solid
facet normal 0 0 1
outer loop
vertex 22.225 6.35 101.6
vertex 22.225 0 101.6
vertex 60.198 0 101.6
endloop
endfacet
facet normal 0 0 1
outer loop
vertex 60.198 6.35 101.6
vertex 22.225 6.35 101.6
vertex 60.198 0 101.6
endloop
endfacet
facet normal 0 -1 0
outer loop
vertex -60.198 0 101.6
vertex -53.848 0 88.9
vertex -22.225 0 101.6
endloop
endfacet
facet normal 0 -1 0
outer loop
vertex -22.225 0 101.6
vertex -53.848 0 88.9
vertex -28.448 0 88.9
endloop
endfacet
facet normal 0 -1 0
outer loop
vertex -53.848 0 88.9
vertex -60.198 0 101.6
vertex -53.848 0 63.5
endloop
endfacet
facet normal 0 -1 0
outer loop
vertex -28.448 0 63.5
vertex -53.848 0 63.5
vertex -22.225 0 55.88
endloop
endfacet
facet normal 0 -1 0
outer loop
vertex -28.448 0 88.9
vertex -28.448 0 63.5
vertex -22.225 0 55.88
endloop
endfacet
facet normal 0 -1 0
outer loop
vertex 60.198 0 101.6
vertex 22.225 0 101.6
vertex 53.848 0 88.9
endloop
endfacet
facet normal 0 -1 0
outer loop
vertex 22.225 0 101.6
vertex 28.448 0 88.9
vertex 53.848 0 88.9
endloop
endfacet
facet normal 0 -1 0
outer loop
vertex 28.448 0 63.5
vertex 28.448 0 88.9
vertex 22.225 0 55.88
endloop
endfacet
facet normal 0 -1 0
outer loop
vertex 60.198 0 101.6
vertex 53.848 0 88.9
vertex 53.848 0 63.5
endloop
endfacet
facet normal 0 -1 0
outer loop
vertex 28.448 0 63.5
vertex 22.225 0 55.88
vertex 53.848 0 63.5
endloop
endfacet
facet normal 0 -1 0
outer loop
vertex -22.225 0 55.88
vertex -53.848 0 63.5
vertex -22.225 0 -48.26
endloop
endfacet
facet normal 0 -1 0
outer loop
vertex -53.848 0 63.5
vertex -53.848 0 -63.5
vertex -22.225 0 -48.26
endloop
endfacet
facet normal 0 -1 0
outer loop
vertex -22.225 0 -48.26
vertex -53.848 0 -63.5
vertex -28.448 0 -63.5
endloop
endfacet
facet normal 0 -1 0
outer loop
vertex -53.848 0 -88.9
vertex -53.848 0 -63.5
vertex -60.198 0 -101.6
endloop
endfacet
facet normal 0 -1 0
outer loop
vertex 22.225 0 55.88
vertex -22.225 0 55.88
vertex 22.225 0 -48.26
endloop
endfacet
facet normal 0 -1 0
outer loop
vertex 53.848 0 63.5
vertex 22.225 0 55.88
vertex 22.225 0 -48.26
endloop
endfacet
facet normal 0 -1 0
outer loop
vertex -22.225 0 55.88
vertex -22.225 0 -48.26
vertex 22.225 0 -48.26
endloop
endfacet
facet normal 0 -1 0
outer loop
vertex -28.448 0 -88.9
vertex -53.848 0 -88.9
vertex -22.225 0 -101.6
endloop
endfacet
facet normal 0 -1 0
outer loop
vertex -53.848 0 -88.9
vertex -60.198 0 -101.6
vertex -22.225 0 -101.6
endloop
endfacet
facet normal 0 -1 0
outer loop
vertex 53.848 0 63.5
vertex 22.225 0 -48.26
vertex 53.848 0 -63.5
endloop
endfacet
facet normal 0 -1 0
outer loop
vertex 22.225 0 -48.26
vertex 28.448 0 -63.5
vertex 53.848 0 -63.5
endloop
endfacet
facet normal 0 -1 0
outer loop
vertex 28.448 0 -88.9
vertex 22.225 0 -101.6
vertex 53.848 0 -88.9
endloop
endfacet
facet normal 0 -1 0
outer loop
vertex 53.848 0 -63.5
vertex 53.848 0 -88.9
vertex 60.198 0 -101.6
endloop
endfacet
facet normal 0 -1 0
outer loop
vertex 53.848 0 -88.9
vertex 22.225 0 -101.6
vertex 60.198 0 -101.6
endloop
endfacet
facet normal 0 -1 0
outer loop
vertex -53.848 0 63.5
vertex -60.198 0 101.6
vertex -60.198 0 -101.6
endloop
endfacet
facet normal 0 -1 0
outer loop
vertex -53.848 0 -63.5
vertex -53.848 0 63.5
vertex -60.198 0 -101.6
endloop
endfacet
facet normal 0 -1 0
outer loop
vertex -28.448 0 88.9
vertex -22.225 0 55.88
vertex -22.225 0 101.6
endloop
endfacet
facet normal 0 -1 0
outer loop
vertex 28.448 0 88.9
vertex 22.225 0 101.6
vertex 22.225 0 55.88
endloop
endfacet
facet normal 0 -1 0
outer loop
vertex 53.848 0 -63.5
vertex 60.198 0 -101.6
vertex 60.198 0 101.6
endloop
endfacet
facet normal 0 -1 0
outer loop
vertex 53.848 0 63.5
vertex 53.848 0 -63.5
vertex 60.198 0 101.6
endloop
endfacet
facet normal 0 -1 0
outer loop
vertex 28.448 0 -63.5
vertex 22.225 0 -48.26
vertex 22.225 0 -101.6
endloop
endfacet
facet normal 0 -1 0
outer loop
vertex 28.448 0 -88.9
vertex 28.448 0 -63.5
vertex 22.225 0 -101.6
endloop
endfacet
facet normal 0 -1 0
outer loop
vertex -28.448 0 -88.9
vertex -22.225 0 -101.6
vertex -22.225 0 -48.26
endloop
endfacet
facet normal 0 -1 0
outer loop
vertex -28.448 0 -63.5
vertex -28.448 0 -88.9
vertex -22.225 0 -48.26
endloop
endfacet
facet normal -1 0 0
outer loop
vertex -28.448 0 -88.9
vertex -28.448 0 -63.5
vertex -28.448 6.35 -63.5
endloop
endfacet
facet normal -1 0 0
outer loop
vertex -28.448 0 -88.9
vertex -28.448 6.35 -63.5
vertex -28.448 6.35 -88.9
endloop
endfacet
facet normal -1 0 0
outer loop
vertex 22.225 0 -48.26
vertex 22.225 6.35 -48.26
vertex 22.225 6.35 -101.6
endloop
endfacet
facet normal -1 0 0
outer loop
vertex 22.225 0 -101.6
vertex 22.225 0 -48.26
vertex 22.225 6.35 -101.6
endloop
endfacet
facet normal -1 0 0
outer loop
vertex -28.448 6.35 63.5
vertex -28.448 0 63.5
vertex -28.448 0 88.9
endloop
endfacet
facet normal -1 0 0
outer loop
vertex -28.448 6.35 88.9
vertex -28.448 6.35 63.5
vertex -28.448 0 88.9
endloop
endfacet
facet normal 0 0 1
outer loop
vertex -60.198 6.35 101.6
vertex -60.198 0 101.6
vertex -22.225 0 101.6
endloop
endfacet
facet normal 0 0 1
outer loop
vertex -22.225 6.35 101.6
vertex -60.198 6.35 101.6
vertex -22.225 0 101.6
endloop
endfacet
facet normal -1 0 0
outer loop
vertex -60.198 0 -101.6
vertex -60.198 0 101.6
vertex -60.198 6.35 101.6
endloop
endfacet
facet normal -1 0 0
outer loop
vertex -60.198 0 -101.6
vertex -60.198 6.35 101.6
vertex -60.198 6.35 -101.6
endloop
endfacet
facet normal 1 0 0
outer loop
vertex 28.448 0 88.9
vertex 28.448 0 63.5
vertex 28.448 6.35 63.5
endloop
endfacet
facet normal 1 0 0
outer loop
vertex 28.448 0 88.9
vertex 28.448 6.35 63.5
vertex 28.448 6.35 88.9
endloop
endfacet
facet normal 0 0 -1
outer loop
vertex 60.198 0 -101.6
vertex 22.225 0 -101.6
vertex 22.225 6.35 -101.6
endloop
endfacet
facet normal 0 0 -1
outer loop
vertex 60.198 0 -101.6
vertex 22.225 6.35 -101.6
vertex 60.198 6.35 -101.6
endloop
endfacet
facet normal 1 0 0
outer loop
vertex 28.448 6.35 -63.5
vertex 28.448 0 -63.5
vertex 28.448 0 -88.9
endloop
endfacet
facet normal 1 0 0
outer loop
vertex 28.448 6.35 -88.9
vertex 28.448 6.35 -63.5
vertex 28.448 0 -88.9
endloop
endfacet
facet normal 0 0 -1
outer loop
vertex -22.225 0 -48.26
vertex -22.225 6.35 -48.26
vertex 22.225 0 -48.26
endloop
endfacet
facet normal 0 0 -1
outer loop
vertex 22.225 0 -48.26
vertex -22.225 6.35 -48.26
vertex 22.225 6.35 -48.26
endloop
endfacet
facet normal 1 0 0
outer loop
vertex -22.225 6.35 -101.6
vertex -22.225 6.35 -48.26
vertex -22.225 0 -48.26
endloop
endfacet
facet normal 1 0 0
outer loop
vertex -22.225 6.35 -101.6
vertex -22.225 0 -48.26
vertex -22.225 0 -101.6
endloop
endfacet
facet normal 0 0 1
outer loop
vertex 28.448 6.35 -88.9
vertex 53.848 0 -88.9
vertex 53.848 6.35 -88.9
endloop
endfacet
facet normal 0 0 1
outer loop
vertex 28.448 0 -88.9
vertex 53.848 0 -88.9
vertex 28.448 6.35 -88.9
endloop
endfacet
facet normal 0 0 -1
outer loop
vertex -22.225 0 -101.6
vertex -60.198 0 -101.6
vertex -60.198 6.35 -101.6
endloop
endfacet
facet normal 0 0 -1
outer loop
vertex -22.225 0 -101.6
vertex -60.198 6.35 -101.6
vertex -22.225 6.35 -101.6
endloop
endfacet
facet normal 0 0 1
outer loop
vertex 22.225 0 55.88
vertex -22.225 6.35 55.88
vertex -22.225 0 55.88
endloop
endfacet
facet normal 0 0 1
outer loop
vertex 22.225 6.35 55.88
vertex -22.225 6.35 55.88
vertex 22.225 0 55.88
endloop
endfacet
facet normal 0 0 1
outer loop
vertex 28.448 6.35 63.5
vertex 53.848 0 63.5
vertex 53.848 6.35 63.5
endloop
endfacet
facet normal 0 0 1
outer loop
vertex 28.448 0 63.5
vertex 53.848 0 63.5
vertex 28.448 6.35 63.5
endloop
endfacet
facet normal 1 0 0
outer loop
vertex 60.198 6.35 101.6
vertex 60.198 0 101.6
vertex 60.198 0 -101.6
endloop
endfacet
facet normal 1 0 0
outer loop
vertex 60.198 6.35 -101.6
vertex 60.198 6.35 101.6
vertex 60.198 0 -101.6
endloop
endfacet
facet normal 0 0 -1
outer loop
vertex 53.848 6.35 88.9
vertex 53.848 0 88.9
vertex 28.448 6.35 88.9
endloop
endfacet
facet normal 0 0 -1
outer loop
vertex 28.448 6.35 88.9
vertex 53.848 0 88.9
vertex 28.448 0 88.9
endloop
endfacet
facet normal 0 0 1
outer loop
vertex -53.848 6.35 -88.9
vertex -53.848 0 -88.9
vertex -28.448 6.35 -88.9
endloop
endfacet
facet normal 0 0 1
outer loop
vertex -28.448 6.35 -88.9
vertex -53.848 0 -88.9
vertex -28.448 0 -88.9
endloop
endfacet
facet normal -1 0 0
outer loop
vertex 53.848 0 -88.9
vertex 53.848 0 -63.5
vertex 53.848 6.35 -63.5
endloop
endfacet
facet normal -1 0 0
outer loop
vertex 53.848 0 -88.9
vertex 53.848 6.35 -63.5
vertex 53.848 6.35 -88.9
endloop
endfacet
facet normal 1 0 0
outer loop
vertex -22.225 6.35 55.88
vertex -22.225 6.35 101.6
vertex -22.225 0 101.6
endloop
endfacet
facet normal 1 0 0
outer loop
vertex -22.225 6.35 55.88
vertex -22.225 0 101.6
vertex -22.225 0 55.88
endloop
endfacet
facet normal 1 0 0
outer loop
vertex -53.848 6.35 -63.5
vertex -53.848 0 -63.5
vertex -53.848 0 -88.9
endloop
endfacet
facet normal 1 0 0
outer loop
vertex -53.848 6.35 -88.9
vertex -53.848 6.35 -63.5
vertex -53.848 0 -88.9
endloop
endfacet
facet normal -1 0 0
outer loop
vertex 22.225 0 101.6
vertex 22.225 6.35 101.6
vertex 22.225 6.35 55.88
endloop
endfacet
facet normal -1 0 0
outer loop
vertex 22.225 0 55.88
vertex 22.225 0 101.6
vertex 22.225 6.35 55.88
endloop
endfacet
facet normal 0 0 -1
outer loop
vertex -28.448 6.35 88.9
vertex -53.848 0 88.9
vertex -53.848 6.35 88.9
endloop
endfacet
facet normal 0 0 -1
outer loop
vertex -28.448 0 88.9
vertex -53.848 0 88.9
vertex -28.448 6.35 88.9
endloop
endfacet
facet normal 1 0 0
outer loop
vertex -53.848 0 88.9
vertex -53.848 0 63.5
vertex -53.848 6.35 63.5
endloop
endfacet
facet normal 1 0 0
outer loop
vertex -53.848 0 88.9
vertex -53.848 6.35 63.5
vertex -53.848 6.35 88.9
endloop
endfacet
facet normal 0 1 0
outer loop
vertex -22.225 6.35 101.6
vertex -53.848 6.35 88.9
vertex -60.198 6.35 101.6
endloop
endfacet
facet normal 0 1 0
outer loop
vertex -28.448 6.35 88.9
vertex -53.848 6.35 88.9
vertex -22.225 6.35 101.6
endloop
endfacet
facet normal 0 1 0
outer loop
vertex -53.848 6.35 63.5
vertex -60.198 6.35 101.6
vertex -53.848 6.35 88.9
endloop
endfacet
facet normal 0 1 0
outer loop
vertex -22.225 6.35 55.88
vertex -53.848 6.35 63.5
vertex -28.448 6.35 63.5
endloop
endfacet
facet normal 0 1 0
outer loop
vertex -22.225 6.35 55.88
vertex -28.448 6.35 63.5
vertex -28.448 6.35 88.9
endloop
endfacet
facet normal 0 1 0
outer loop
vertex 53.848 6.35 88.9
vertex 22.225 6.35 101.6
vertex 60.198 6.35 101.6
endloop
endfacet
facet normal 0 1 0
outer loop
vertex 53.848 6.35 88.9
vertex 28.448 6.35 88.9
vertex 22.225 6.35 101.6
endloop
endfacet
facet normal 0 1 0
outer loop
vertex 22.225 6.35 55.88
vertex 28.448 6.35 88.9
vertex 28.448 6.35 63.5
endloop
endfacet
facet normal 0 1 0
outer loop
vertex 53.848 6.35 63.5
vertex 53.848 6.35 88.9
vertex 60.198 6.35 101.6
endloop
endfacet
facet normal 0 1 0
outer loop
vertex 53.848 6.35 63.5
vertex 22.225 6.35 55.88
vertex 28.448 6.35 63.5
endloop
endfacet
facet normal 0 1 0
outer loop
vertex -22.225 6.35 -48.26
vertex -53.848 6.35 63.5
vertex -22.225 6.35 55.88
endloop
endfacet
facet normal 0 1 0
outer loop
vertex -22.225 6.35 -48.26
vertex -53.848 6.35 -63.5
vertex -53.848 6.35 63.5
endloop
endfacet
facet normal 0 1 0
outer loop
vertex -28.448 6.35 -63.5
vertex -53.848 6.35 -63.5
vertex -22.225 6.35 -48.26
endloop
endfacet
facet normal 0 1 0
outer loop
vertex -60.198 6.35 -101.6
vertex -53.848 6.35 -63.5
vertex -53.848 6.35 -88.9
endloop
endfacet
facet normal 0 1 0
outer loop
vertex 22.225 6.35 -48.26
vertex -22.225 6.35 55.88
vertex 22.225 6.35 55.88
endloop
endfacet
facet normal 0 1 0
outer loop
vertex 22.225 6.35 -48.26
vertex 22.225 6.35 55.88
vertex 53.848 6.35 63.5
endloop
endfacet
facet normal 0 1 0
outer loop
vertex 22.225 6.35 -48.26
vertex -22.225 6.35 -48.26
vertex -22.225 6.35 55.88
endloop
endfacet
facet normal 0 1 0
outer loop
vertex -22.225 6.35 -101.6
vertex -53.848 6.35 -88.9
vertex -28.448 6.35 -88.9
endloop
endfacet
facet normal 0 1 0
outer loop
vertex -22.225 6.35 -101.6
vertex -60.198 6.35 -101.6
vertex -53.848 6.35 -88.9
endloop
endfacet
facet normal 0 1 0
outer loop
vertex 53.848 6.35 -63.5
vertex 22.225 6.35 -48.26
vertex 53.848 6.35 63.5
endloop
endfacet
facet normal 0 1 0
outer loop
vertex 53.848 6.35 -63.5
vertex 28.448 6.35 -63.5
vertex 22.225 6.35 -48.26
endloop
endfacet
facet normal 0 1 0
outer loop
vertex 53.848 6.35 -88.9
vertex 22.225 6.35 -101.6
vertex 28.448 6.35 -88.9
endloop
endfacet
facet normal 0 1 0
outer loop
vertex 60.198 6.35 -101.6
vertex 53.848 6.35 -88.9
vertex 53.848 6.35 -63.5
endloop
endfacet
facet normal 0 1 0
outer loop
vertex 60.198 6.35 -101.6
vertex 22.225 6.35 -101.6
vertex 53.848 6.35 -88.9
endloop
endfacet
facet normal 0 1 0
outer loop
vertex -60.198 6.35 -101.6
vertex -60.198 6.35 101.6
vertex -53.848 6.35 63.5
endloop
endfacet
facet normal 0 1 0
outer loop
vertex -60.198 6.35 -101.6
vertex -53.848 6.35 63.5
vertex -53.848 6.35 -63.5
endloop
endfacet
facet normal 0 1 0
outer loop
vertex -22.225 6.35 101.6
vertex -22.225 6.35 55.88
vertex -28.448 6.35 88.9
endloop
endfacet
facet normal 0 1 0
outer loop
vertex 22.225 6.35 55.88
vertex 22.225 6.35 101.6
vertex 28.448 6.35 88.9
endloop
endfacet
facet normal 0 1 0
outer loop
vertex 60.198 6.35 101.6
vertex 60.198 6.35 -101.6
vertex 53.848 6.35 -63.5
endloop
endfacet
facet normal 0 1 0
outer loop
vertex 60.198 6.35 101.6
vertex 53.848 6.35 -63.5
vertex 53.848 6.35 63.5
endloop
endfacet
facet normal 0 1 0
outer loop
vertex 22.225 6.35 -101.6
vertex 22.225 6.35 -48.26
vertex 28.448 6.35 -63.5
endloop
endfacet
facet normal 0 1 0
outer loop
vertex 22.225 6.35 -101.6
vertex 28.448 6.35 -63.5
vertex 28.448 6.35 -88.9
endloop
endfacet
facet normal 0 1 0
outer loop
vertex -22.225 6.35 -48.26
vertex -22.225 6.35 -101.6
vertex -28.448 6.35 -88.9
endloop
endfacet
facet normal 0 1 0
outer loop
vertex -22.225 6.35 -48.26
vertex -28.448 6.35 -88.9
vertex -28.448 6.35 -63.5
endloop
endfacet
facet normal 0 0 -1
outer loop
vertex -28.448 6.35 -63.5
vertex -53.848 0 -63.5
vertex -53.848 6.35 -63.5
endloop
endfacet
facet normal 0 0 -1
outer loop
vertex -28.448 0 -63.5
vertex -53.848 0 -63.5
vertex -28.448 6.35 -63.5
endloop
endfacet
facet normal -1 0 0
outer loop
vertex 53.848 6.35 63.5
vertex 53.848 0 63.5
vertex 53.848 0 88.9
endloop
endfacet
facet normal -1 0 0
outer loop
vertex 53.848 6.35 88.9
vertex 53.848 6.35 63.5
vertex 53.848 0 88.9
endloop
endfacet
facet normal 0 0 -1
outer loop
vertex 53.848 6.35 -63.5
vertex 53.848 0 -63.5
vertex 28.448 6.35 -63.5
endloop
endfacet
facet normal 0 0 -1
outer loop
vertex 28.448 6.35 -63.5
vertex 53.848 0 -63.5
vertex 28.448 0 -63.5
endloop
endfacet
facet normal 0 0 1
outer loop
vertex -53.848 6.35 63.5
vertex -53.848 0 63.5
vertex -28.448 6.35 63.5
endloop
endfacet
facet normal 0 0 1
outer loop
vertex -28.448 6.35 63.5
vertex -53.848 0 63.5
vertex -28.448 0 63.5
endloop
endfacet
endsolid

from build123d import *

# Parameters (mm, degrees)
SKETCH1_W               = 120.396
SKETCH1_H               = 203.2
BOSS_EXTRUDE1_DEPTH     = 6.35
CUT_EXTRUDE1_START      = -7.35
SKETCH2_W               = 25.4
SKETCH2_H               = 25.4
CUT_EXTRUDE1_DEPTH      = 8.35
MIRROR2_START           = -7.35
MIRROR2_COPY_1_SKETCH_W = 25.4
MIRROR2_COPY_1_SKETCH_H = 25.4
MIRROR2_COPY_1_DEPTH    = 8.35
SKETCH3_W               = 44.45
SKETCH3_H               = 45.72
SKETCH3_H_2             = 53.34
CUT_EXTRUDE2_DEPTH      = 7.35


with BuildPart() as part:
    # Sketch1 → Boss-Extrude1 (new body)
    with BuildSketch(Plane(origin=(0, 0, 0), x_dir=(1, 0, 0), z_dir=(0, 1, 0))):
        Rectangle(SKETCH1_W, SKETCH1_H)
    extrude(amount=BOSS_EXTRUDE1_DEPTH)

    # Sketch2 → Cut-Extrude1 (cut)
    with BuildSketch(Plane(origin=(0, 6.35, 0), x_dir=(1, 0, 0), z_dir=(0, 1, 0)).offset(CUT_EXTRUDE1_START)):
        with Locations((-41.148, 76.2)):
            Rectangle(SKETCH2_W, SKETCH2_H)
    cut_extrude1 = extrude(amount=CUT_EXTRUDE1_DEPTH, mode=Mode.SUBTRACT)

    # Mirror1: Cut-Extrude1 across plane
    add(cut_extrude1.mirror(Plane.XY), mode=Mode.SUBTRACT)

    # Mirror2: Cut-Extrude1 across plane
    add(cut_extrude1.mirror(Plane(origin=(0, 0, 0), x_dir=(0, 0, 1), z_dir=(1, 0, 0))), mode=Mode.SUBTRACT)

    # Mirror2 copy 1 sketch → Mirror2 copy 1 (cut)
    with BuildSketch(Plane(origin=(0, 6.35, 0), x_dir=(-1, 0, 0), z_dir=(0, 1, 0)).offset(MIRROR2_START)):
        with Locations((-41.148, 76.2)):
            Rectangle(MIRROR2_COPY_1_SKETCH_W, MIRROR2_COPY_1_SKETCH_H)
    extrude(amount=MIRROR2_COPY_1_DEPTH, mode=Mode.SUBTRACT)

    # Sketch3 → Cut-Extrude2 (cut, through all)
    with BuildSketch(Plane(origin=(0, 6.35, 0), x_dir=(1, 0, 0), z_dir=(0, 1, 0))):
        with Locations((0, -78.74)):
            Rectangle(SKETCH3_W, SKETCH3_H)
        with Locations((0, 74.93)):
            Rectangle(SKETCH3_W, SKETCH3_H_2)
    extrude(amount=-CUT_EXTRUDE2_DEPTH, mode=Mode.SUBTRACT)


solid = part.part
